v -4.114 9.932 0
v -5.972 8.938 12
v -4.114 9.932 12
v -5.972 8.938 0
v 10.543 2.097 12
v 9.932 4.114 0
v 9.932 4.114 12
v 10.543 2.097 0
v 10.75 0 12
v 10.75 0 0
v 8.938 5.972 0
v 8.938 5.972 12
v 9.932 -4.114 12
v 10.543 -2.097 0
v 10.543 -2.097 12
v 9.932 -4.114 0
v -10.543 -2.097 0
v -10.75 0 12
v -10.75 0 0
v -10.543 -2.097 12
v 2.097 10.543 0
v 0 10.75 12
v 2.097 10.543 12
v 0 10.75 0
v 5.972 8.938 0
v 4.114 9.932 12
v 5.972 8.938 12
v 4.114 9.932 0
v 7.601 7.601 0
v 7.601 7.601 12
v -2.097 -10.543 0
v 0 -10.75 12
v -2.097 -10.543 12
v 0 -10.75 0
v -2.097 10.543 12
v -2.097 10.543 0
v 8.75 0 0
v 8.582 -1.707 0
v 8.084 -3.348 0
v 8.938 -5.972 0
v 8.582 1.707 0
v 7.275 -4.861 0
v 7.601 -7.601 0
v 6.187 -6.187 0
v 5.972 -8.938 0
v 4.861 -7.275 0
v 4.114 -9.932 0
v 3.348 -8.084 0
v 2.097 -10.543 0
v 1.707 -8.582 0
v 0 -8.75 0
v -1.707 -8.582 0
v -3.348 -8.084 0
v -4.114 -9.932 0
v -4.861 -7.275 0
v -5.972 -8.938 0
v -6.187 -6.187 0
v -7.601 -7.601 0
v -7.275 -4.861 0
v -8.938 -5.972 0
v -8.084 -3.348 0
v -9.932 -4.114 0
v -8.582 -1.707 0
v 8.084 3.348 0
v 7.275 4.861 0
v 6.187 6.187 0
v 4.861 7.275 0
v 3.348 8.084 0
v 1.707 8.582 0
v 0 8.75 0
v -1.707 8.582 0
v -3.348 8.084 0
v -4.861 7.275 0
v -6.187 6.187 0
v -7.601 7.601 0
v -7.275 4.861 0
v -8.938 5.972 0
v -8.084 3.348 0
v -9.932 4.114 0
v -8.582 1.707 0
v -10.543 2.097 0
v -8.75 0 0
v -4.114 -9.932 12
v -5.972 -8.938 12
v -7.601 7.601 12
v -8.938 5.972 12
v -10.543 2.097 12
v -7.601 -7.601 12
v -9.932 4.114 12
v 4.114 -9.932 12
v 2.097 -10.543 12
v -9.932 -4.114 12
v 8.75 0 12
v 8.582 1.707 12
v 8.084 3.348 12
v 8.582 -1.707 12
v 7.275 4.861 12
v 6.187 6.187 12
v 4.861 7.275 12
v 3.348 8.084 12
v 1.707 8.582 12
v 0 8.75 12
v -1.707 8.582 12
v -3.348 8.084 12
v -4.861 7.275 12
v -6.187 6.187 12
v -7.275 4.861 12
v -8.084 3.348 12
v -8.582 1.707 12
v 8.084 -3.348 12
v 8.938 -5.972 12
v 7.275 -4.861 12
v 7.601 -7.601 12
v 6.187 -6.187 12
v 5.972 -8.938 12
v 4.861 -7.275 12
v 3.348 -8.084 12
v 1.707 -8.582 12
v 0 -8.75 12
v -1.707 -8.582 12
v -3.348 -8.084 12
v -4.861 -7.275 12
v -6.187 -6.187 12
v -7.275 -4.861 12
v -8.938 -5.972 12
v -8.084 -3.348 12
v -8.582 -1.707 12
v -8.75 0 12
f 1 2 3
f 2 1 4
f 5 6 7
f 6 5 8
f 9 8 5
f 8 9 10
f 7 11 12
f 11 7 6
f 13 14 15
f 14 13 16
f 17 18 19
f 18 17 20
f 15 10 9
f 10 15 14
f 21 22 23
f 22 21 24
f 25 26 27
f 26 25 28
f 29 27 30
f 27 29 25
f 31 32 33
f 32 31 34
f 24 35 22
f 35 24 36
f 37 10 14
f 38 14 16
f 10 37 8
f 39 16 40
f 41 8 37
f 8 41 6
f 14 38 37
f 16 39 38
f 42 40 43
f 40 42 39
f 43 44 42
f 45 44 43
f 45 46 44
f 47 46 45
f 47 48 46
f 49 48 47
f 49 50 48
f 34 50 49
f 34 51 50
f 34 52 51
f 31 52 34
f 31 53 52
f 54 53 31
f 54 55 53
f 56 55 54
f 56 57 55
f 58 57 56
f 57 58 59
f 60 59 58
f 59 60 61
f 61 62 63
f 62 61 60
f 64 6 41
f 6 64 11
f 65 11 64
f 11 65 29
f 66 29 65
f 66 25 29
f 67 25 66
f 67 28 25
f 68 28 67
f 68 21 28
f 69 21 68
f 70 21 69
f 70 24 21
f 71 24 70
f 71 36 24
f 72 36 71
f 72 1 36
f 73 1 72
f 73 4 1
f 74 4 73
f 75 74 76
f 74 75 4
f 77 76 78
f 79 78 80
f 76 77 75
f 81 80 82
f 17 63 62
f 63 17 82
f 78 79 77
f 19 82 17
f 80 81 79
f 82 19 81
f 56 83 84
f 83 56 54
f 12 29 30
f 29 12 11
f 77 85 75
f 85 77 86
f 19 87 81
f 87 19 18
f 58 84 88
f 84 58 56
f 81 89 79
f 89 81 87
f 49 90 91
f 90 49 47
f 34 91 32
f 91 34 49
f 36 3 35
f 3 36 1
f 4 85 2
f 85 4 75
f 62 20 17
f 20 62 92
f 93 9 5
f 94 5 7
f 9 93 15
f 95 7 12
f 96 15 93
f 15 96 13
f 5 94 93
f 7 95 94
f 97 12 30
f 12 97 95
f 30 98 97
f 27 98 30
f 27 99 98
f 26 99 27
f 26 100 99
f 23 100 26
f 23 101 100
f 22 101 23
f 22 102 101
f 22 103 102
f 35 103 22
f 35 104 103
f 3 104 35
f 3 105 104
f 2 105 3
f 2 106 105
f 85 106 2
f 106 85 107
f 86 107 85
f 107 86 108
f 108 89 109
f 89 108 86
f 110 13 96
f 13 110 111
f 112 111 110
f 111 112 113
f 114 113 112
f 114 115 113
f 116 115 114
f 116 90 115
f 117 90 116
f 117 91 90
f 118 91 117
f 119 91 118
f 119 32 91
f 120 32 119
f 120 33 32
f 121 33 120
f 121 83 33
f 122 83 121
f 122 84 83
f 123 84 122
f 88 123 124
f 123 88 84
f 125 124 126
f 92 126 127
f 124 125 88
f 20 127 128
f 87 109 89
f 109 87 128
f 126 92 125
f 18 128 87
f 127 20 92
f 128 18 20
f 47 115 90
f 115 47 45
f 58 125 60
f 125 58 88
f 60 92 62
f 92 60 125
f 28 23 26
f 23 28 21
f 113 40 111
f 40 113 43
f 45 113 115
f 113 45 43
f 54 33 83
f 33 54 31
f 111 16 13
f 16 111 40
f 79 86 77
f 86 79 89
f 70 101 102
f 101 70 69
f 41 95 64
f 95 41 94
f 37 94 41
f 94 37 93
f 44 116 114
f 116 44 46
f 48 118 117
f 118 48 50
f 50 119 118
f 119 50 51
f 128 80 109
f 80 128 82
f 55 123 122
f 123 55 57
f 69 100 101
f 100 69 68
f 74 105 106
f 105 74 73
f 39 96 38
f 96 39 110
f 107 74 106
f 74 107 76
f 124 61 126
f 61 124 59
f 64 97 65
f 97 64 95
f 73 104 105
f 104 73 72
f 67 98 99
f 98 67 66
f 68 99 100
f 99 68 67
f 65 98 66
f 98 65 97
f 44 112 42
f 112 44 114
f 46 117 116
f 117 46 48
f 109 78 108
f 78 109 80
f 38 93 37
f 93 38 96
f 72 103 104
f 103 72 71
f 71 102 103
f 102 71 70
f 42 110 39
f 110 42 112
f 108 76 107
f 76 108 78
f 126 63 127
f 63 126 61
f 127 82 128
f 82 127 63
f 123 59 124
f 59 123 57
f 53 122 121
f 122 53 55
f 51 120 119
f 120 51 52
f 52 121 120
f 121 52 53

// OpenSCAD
$fn = 32;

// ----------------------------------------------------------------------
// Spacer sleeve: 21.5 / 17.5 x 12 mm
// ----------------------------------------------------------------------

// --- parameters (mm) ---
sleeve_od = 21.5;         // outside diameter
sleeve_id = 17.5;         // shaft bore
sleeve_l = 12;            // sleeve length

module sleeve() {
  cylinder(h = sleeve_l, d = sleeve_od);
}

difference() {
  sleeve();
  translate([0, 0, -1]) cylinder(h = sleeve_l + 2, d = sleeve_id);
}
